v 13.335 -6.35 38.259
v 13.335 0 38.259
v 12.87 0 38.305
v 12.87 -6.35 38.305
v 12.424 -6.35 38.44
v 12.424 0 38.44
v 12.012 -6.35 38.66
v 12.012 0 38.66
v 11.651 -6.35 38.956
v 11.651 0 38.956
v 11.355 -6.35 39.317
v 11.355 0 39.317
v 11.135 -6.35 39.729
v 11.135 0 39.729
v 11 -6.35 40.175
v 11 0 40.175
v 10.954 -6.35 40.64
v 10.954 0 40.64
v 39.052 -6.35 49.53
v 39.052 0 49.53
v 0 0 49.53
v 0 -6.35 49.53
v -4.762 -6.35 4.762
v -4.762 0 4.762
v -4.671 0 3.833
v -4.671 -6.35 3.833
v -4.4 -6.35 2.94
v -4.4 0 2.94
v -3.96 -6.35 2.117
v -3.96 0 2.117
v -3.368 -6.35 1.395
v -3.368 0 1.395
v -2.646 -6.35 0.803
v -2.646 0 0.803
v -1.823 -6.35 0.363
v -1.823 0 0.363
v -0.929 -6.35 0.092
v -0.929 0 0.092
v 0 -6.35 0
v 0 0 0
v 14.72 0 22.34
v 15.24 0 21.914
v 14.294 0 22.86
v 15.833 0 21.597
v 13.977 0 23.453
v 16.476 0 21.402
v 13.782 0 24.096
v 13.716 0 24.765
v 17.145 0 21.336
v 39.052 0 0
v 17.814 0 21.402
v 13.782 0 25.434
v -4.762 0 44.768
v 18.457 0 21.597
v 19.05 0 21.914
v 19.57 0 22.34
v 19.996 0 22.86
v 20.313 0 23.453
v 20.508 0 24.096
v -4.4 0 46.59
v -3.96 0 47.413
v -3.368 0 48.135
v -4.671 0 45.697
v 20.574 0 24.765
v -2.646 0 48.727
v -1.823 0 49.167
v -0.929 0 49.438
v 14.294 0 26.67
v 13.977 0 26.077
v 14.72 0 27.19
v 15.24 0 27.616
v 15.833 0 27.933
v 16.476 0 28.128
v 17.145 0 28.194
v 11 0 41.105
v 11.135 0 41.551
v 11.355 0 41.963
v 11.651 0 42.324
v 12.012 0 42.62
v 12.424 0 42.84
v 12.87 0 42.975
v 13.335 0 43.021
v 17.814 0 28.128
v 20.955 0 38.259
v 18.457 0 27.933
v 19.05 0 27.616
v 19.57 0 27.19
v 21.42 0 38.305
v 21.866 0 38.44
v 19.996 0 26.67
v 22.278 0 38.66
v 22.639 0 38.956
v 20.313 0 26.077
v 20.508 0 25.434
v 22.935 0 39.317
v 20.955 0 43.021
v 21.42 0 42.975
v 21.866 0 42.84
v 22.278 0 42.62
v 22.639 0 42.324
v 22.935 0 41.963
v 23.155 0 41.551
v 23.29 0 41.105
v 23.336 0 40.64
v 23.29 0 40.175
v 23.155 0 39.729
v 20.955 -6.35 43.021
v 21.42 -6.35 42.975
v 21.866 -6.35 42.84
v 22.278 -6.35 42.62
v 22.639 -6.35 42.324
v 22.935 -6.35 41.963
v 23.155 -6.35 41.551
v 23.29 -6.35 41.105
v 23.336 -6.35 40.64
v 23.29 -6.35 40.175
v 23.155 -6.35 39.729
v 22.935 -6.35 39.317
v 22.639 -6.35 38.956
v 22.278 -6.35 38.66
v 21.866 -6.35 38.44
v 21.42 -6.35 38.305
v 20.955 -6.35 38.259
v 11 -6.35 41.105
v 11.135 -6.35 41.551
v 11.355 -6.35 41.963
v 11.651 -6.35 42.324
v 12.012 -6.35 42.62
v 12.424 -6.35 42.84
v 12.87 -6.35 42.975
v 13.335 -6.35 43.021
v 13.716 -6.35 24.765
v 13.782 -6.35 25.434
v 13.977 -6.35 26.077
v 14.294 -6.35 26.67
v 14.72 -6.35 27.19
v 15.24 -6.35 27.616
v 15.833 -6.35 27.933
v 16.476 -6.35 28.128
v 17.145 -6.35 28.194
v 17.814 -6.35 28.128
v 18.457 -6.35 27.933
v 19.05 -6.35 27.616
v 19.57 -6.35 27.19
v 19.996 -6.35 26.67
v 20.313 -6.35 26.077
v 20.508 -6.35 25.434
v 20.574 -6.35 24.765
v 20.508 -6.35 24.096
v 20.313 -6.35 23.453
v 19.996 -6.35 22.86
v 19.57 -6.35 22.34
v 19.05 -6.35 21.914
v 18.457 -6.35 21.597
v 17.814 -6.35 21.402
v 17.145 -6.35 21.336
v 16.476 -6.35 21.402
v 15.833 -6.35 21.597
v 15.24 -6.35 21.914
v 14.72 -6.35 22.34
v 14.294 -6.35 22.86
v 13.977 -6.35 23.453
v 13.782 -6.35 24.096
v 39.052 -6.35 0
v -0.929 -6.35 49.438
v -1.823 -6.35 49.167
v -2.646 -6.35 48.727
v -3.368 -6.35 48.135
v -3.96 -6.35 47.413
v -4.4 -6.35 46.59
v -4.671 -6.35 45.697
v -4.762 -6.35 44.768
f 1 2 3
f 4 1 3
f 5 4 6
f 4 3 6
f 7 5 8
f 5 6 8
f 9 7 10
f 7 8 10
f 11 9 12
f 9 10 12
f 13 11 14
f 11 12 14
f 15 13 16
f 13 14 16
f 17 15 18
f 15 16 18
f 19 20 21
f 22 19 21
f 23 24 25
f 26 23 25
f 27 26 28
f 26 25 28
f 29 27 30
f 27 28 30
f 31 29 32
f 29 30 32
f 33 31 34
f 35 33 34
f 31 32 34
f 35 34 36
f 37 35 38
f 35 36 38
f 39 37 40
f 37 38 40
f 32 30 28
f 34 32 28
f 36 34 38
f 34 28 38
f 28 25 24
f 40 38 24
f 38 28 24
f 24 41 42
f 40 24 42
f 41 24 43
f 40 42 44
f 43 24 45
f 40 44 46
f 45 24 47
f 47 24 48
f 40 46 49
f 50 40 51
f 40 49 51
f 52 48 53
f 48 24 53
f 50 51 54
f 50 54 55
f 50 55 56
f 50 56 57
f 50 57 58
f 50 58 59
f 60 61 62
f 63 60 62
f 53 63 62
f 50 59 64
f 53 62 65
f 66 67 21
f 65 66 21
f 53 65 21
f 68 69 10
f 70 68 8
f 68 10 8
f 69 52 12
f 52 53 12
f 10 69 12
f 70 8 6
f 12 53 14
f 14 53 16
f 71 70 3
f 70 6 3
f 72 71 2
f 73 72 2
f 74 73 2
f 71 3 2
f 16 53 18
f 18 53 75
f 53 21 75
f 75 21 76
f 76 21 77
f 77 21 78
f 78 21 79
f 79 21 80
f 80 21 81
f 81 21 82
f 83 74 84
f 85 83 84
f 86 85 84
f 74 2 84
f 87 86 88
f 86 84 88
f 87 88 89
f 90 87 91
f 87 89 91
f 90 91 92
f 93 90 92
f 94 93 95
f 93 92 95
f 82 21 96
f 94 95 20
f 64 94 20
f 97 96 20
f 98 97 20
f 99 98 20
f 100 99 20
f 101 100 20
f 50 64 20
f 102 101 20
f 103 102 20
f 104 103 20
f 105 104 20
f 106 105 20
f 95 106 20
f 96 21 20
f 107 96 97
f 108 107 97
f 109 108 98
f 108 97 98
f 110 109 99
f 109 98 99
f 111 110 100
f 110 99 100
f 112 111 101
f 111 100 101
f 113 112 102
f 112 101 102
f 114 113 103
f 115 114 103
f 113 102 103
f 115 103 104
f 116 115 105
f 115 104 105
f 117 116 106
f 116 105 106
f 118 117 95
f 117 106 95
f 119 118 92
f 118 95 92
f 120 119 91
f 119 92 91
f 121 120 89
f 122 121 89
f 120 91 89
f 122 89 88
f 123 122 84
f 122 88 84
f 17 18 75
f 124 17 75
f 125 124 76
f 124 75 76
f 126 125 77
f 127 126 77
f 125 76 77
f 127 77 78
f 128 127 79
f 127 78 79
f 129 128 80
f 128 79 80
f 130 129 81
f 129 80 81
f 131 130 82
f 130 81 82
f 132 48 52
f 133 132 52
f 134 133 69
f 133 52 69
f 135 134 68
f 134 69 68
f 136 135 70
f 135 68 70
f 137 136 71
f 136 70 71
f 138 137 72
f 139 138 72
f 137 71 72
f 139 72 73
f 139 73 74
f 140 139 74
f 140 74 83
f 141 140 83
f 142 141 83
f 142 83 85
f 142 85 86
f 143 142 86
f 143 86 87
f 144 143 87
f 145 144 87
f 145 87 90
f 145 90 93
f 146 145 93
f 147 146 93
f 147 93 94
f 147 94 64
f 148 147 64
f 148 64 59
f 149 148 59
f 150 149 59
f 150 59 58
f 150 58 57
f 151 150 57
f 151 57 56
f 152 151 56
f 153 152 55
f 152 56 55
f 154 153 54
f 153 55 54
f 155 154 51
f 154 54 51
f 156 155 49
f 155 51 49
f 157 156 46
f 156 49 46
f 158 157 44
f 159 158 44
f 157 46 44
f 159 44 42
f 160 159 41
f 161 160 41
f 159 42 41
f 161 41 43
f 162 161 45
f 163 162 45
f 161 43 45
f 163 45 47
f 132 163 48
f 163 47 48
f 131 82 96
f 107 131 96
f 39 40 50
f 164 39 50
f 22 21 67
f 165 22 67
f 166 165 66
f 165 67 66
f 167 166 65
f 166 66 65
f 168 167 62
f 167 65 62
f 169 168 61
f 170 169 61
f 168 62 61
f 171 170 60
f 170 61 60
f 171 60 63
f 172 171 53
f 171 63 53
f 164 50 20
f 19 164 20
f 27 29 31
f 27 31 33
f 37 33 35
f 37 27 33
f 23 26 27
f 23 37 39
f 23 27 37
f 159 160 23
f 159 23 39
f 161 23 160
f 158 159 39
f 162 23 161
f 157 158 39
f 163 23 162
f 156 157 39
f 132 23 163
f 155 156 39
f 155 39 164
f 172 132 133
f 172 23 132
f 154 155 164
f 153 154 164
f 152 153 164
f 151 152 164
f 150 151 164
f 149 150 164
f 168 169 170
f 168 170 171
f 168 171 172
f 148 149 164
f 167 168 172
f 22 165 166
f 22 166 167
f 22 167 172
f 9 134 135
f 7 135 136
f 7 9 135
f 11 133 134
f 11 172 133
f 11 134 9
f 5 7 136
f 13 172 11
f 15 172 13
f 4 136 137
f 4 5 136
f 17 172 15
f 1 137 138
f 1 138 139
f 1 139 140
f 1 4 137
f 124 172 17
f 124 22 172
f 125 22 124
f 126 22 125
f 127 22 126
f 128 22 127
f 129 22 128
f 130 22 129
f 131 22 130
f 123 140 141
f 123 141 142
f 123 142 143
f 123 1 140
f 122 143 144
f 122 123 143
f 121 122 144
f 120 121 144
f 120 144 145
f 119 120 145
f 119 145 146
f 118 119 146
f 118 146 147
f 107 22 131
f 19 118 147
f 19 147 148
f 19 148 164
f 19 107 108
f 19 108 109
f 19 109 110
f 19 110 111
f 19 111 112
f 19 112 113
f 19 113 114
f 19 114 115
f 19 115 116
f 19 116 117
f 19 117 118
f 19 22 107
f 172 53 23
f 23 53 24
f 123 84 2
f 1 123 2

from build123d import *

# Parameters (mm, degrees)
F1_DEPTH = 6.35
F3_D     = 6.858
F3_DEPTH = 12.7
F5_DEPTH = 25.4


with BuildPart() as f1:
    # F0 (on Front) → F1 (new body)
    with BuildSketch(Plane.XZ):
        with BuildLine():
            ThreePointArc((0, 49.53), (-3.367596, 48.135096), (-4.7625, 44.7675))
            Line((-4.7625, 44.7675), (-4.7625, 4.7625))
            ThreePointArc((-4.7625, 4.7625), (-3.367596, 1.394904), (0, 0))
            Line((0, 0), (39.0525, 0))
            Line((39.0525, 0), (39.0525, 3.175))
            Line((39.0525, 3.175), (39.0525, 14.2875))
            Line((39.0525, 14.2875), (39.0525, 35.2425))
            Line((39.0525, 35.2425), (39.0525, 46.355))
            Line((39.0525, 46.355), (39.0525, 49.53))
            Line((39.0525, 49.53), (0, 49.53))
        make_face()
    extrude(amount=F1_DEPTH)

    # F3
    with Locations(Plane.XZ.offset(6.35)):
        with Locations((17.145, 24.765)):
            Hole(F3_D / 2, depth=F3_DEPTH)

    # F4 (on face) → F5 (cut)
    with BuildSketch(Plane(origin=(0, 0, 0), x_dir=(-1, 0, 0), z_dir=(0, 1, 0))):
        with BuildLine():
            ThreePointArc((-20.955, 43.02125), (-19.271202, 42.323798), (-18.57375, 40.64))
            ThreePointArc((-18.57375, 40.64), (-19.271202, 38.956202), (-20.955, 38.25875))
            Line((-20.955, 38.25875), (-13.335, 38.25875))
            ThreePointArc((-13.335, 38.25875), (-15.71625, 40.64), (-13.335, 43.02125))
            Line((-13.335, 43.02125), (-20.955, 43.02125))
        make_face()
        with BuildLine():
            ThreePointArc((-20.955, 38.25875), (-19.271202, 38.956202), (-18.57375, 40.64))
            ThreePointArc((-18.57375, 40.64), (-19.271202, 42.323798), (-20.955, 43.02125))
            ThreePointArc((-20.955, 43.02125), (-23.33625, 40.64), (-20.955, 38.25875))
        make_face()
        with BuildLine():
            ThreePointArc((-10.95375, 40.64), (-11.651202, 42.323798), (-13.335, 43.02125))
            ThreePointArc((-13.335, 43.02125), (-15.71625, 40.64), (-13.335, 38.25875))
            ThreePointArc((-13.335, 38.25875), (-11.651202, 38.956202), (-10.95375, 40.64))
        make_face()
    extrude(amount=-F5_DEPTH, mode=Mode.SUBTRACT)


solid = f1.part
